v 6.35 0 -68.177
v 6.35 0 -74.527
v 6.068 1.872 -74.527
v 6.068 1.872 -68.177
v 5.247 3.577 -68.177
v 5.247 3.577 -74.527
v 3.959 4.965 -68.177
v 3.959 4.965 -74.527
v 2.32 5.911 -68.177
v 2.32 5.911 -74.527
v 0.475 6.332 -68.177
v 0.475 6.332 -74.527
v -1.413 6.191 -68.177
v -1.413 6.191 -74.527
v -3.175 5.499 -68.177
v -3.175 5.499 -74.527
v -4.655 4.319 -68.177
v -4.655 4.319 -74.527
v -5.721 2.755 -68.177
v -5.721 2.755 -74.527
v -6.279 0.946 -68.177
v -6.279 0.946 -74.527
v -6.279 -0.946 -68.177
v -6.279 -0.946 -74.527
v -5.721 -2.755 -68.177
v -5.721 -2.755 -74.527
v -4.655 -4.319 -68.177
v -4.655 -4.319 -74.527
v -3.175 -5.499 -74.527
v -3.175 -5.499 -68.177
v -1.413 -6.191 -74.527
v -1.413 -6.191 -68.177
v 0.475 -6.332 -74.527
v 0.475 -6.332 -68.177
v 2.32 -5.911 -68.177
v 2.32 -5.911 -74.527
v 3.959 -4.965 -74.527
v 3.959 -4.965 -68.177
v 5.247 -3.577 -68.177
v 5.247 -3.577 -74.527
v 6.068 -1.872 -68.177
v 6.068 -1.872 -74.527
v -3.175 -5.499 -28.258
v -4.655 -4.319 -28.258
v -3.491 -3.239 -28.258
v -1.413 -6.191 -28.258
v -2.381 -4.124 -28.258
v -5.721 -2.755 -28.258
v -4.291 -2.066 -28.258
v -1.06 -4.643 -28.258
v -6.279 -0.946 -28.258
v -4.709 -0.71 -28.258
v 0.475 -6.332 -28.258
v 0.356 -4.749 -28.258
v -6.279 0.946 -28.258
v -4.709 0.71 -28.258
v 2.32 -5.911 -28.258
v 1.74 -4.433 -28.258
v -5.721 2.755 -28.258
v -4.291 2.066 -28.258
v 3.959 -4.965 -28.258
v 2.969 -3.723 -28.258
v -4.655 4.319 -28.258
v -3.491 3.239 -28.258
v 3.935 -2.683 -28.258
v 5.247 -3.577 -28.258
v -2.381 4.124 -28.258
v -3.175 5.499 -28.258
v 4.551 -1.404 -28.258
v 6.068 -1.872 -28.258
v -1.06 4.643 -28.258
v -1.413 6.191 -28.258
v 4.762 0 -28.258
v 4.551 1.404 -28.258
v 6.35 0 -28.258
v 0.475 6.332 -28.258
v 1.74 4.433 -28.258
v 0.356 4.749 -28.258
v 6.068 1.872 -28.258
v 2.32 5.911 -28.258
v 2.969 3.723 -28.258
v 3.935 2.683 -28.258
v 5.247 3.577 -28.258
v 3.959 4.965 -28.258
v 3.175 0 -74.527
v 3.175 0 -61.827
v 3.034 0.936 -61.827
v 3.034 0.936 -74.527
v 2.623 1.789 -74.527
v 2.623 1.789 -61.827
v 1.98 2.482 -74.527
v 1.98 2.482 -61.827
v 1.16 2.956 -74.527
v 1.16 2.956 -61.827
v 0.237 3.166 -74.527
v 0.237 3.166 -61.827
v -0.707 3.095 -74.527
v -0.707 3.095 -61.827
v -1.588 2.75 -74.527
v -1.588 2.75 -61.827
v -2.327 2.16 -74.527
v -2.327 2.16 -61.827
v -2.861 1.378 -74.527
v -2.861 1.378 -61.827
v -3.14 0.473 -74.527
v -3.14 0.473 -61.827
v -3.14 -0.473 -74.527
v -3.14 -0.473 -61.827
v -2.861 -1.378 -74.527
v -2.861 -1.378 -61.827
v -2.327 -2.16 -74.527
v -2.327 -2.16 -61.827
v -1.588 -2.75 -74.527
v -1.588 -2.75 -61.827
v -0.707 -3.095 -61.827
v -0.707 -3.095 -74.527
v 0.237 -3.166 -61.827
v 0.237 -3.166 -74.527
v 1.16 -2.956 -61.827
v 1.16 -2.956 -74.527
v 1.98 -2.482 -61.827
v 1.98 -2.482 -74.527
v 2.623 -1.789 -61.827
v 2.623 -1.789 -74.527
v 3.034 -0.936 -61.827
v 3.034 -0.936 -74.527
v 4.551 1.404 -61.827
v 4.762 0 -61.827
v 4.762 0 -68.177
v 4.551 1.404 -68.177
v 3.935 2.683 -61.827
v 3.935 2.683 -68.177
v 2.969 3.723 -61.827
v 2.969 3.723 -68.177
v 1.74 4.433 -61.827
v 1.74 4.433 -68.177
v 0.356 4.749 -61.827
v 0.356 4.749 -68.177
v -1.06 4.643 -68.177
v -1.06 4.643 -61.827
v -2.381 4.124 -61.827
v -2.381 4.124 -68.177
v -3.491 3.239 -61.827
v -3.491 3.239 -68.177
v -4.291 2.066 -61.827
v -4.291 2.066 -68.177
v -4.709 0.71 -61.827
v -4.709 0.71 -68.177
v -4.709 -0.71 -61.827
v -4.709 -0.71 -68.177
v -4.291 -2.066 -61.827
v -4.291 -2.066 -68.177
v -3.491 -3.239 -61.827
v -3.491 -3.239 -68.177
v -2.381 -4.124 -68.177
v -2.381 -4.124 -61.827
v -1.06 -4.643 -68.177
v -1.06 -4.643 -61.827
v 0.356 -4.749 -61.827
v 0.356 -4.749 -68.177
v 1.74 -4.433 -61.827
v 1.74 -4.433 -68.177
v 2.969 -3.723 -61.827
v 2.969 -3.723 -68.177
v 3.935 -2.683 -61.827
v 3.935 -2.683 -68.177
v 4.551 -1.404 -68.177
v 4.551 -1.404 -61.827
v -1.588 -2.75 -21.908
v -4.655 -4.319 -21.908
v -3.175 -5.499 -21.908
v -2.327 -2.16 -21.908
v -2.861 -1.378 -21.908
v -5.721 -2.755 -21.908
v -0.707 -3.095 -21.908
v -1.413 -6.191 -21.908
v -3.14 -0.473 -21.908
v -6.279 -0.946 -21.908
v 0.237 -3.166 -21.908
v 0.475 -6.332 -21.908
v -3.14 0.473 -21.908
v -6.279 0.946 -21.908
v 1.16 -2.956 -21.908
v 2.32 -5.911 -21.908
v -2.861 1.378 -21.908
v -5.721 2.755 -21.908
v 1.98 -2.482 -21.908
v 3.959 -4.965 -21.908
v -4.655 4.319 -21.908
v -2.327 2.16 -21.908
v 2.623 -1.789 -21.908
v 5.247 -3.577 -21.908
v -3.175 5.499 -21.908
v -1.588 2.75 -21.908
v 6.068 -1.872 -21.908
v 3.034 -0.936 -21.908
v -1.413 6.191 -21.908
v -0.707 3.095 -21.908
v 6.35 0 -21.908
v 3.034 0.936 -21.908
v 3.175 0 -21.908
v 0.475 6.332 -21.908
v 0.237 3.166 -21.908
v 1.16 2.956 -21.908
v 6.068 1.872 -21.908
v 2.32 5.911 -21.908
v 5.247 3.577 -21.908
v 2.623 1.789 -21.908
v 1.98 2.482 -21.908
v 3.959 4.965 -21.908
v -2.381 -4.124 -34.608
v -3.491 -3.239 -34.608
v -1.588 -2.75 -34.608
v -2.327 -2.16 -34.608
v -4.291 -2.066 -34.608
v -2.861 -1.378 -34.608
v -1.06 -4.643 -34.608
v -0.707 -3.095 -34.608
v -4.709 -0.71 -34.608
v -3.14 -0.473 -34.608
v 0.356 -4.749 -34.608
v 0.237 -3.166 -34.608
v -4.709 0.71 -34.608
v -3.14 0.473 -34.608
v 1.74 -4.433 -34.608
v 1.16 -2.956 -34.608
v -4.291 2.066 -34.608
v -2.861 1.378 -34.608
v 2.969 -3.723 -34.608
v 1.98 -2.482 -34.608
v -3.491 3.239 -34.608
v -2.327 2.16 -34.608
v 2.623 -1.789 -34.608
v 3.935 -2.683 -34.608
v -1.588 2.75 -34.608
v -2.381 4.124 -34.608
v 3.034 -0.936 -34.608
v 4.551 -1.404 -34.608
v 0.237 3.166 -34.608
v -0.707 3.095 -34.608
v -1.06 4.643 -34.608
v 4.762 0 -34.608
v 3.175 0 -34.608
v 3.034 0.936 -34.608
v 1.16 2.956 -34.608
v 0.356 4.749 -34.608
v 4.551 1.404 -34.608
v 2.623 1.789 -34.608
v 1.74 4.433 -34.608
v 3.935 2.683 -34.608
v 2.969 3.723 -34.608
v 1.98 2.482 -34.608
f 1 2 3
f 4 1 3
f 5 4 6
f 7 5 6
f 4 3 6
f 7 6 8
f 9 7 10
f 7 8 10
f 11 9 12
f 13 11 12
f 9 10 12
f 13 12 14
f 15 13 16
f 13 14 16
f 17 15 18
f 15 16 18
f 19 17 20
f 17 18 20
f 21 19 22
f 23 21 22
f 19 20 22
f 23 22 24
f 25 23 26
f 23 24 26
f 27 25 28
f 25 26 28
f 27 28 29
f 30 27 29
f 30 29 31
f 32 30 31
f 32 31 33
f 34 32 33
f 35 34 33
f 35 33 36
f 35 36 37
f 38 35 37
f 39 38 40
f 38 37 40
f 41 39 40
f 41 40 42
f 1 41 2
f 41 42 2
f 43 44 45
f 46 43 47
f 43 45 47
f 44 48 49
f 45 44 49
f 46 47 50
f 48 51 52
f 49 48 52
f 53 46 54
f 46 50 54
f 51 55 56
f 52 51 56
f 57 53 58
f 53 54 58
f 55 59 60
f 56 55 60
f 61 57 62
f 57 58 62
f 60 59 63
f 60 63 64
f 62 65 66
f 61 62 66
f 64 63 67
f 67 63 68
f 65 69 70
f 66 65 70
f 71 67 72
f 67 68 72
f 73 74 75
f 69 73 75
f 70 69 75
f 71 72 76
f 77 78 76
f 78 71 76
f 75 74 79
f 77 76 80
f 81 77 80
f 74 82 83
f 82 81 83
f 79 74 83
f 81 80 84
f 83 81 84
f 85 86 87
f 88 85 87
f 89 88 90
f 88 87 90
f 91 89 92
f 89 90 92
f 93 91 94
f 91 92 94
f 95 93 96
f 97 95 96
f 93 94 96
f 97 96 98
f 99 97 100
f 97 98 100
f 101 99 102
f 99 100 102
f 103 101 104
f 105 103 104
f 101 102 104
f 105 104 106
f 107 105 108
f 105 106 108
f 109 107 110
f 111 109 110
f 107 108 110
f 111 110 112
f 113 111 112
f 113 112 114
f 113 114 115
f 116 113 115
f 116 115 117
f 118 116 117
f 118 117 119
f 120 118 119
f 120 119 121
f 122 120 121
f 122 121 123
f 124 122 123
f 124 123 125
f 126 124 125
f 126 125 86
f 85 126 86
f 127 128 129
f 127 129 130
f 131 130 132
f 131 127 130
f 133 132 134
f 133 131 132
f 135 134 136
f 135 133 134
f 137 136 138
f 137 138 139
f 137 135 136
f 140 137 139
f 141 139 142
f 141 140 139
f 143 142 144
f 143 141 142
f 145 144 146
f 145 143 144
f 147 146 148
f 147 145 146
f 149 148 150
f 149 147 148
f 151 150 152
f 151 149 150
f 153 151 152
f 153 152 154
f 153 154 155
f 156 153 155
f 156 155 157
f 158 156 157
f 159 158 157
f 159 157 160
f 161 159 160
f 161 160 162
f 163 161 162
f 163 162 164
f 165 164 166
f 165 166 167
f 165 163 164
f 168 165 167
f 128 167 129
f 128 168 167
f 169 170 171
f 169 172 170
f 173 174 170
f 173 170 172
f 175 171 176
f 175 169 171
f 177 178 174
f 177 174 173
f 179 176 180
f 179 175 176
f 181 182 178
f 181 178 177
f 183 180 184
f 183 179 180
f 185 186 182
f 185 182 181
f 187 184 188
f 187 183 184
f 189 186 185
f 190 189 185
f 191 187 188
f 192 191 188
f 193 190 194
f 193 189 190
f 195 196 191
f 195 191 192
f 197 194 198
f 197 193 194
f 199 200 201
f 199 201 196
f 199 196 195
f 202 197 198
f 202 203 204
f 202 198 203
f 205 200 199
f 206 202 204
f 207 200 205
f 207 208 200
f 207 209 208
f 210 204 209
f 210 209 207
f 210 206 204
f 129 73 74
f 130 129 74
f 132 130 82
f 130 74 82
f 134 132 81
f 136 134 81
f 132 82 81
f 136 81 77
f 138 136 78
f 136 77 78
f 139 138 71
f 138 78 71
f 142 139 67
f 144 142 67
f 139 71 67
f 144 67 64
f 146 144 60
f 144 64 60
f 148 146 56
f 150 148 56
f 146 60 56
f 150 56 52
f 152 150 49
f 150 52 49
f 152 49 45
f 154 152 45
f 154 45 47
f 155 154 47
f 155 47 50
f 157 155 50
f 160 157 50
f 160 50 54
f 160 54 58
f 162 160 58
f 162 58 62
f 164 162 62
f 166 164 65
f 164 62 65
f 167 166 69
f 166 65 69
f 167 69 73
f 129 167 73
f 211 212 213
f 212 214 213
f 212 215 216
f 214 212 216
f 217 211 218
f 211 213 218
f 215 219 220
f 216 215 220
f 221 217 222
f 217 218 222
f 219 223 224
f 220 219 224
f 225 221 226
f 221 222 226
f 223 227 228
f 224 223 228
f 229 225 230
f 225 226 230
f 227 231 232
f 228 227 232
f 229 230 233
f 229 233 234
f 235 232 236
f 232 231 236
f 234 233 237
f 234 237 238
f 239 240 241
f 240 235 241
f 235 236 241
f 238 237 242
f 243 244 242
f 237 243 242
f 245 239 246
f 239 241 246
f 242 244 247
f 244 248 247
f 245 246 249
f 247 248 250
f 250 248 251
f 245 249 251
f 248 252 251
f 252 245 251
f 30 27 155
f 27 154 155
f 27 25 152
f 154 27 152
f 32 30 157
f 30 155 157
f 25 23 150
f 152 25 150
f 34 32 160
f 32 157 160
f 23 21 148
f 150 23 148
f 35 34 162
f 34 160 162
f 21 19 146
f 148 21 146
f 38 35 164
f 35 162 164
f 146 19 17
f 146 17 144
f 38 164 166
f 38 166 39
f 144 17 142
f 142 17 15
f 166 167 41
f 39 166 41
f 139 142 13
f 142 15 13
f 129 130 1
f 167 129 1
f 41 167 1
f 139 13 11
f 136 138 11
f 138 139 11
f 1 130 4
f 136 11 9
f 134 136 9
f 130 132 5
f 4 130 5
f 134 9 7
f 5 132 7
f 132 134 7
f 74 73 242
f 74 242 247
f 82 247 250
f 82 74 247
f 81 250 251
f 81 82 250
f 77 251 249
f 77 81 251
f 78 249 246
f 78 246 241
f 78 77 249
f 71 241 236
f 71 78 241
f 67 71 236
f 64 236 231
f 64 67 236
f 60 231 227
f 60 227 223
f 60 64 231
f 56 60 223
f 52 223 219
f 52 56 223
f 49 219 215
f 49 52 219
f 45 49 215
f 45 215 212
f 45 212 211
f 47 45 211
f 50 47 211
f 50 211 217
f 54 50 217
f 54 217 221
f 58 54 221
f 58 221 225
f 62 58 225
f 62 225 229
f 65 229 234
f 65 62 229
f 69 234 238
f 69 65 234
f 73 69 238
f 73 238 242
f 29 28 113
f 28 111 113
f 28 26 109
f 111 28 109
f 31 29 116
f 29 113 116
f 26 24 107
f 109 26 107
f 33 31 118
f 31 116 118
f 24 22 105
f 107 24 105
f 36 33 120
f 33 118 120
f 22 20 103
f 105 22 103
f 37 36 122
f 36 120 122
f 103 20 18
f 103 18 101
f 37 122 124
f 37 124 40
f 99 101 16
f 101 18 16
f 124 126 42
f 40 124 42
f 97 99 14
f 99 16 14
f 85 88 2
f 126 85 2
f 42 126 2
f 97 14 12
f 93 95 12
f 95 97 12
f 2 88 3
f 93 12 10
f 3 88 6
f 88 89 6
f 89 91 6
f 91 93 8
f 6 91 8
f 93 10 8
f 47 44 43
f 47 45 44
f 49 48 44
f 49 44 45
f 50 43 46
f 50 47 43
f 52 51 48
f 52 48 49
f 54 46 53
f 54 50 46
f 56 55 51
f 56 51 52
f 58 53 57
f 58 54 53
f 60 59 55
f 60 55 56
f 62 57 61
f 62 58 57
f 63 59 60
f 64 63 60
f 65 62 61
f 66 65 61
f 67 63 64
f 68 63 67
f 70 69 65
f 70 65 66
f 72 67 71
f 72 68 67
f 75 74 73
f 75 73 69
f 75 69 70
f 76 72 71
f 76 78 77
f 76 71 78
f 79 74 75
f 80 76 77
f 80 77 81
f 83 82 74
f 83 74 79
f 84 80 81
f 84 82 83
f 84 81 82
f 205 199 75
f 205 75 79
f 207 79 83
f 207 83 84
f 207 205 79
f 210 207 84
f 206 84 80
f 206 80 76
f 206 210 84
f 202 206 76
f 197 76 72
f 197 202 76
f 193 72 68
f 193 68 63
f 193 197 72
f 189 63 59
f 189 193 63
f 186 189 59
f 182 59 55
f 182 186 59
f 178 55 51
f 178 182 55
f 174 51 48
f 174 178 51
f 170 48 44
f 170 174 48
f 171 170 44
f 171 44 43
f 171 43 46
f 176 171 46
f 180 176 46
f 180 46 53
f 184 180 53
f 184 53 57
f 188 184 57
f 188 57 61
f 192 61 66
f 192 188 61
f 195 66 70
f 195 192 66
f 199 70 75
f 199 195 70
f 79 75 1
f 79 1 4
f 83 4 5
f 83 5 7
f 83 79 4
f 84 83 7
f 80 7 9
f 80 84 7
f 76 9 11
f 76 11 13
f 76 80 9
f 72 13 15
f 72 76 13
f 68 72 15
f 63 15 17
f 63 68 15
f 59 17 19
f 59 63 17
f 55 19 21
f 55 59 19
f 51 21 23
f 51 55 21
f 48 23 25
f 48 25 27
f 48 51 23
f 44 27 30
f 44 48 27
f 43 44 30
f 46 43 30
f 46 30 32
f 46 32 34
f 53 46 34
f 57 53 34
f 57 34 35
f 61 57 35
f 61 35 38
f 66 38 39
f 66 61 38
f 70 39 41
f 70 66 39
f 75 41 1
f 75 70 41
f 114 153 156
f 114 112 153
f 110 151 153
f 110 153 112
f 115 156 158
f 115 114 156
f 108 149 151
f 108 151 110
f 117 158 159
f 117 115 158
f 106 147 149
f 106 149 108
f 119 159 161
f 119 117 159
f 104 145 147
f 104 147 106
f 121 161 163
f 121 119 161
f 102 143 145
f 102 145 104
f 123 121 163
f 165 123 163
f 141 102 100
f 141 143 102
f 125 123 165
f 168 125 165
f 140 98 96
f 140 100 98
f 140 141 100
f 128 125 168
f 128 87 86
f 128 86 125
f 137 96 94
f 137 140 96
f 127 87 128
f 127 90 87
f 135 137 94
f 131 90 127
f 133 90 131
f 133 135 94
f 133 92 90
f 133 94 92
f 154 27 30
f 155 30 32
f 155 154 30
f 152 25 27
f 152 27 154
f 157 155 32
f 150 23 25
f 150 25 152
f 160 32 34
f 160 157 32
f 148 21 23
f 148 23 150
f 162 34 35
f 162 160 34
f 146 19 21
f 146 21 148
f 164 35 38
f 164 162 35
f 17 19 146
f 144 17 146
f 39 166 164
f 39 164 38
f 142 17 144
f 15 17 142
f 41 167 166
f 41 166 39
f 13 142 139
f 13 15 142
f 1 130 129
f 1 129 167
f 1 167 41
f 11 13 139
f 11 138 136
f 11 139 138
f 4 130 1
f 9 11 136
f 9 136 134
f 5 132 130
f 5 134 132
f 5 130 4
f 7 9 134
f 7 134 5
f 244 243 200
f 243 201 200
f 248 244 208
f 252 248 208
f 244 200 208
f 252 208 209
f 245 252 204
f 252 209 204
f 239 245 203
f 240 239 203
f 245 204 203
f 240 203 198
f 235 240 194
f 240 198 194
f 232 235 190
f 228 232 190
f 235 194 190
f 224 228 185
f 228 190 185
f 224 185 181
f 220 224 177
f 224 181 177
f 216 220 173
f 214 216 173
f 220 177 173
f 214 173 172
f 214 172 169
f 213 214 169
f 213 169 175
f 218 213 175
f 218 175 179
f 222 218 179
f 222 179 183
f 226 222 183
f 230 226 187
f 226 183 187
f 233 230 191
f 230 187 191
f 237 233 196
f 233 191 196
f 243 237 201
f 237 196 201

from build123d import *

# Parameters (mm, degrees)
THREADED_START            = -21.9075
SKETCH2_R                 = 6.35
SKETCH2_R_2               = 4.7625
SKETCH2_R_3               = 3.175
THREADED_INSERT_1_1_DEPTH = 6.35
THREADED_START_2          = -28.2575
SKETCH2_5_R               = 4.7625
SKETCH2_5_R_2             = 3.175
THREADED_INSERT_1_2_DEPTH = 6.35
BOSS_EXTRUDE4_START       = -74.52741
SKETCH2_7_R               = 6.35
SKETCH2_7_R_2             = 4.7625
SKETCH2_7_R_3             = 3.175
BOSS_EXTRUDE4_DEPTH       = 6.35
BOSS_EXTRUDE5_START       = -61.82741
SKETCH2_8_R               = 4.7625
SKETCH2_8_R_2             = 3.175
BOSS_EXTRUDE5_DEPTH       = 6.35
BOSS_EXTRUDE6_START       = -28.2575
SKETCH2_9_R               = 6.35
SKETCH2_9_R_2             = 4.7625
BOSS_EXTRUDE6_DEPTH       = 39.91991


with BuildPart() as part:
    # Sketch2 → Threaded Insert 1-1 (new body)
    # profile 1 of 2: a face of its own
    with BuildSketch(Plane.XY.offset(THREADED_START)):
        Circle(SKETCH2_R)
        Circle(SKETCH2_R_2, mode=Mode.SUBTRACT)
    # profile 2 of 2: a face of its own
    with BuildSketch(Plane.XY.offset(THREADED_START)):
        Circle(SKETCH2_R_2)
        Circle(SKETCH2_R_3, mode=Mode.SUBTRACT)
    extrude(amount=-THREADED_INSERT_1_1_DEPTH)

    # Sketch2<5> → Threaded Insert 1-2 (add)
    with BuildSketch(Plane.XY.offset(THREADED_START_2)):
        Circle(SKETCH2_5_R)
        Circle(SKETCH2_5_R_2, mode=Mode.SUBTRACT)
    extrude(amount=-THREADED_INSERT_1_2_DEPTH)


with BuildPart() as body_2:
    # Sketch2<7> → Boss-Extrude4 (new body)
    # profile 1 of 2: a face of its own
    with BuildSketch(Plane.XY.offset(BOSS_EXTRUDE4_START)):
        Circle(SKETCH2_7_R)
        Circle(SKETCH2_7_R_2, mode=Mode.SUBTRACT)
    # profile 2 of 2: a face of its own
    with BuildSketch(Plane.XY.offset(BOSS_EXTRUDE4_START)):
        Circle(SKETCH2_7_R_2)
        Circle(SKETCH2_7_R_3, mode=Mode.SUBTRACT)
    extrude(amount=BOSS_EXTRUDE4_DEPTH)

    # Sketch2<8> → Boss-Extrude5 (add)
    with BuildSketch(Plane.XY.offset(BOSS_EXTRUDE5_START)):
        Circle(SKETCH2_8_R)
        Circle(SKETCH2_8_R_2, mode=Mode.SUBTRACT)
    extrude(amount=-BOSS_EXTRUDE5_DEPTH)


with BuildPart() as body_3:
    # Sketch2<9> → Boss-Extrude6 (new body)
    with BuildSketch(Plane.XY.offset(BOSS_EXTRUDE6_START)):
        Circle(SKETCH2_9_R)
        Circle(SKETCH2_9_R_2, mode=Mode.SUBTRACT)
    extrude(amount=-BOSS_EXTRUDE6_DEPTH)


solid = Compound([part.part, body_2.part, body_3.part])
